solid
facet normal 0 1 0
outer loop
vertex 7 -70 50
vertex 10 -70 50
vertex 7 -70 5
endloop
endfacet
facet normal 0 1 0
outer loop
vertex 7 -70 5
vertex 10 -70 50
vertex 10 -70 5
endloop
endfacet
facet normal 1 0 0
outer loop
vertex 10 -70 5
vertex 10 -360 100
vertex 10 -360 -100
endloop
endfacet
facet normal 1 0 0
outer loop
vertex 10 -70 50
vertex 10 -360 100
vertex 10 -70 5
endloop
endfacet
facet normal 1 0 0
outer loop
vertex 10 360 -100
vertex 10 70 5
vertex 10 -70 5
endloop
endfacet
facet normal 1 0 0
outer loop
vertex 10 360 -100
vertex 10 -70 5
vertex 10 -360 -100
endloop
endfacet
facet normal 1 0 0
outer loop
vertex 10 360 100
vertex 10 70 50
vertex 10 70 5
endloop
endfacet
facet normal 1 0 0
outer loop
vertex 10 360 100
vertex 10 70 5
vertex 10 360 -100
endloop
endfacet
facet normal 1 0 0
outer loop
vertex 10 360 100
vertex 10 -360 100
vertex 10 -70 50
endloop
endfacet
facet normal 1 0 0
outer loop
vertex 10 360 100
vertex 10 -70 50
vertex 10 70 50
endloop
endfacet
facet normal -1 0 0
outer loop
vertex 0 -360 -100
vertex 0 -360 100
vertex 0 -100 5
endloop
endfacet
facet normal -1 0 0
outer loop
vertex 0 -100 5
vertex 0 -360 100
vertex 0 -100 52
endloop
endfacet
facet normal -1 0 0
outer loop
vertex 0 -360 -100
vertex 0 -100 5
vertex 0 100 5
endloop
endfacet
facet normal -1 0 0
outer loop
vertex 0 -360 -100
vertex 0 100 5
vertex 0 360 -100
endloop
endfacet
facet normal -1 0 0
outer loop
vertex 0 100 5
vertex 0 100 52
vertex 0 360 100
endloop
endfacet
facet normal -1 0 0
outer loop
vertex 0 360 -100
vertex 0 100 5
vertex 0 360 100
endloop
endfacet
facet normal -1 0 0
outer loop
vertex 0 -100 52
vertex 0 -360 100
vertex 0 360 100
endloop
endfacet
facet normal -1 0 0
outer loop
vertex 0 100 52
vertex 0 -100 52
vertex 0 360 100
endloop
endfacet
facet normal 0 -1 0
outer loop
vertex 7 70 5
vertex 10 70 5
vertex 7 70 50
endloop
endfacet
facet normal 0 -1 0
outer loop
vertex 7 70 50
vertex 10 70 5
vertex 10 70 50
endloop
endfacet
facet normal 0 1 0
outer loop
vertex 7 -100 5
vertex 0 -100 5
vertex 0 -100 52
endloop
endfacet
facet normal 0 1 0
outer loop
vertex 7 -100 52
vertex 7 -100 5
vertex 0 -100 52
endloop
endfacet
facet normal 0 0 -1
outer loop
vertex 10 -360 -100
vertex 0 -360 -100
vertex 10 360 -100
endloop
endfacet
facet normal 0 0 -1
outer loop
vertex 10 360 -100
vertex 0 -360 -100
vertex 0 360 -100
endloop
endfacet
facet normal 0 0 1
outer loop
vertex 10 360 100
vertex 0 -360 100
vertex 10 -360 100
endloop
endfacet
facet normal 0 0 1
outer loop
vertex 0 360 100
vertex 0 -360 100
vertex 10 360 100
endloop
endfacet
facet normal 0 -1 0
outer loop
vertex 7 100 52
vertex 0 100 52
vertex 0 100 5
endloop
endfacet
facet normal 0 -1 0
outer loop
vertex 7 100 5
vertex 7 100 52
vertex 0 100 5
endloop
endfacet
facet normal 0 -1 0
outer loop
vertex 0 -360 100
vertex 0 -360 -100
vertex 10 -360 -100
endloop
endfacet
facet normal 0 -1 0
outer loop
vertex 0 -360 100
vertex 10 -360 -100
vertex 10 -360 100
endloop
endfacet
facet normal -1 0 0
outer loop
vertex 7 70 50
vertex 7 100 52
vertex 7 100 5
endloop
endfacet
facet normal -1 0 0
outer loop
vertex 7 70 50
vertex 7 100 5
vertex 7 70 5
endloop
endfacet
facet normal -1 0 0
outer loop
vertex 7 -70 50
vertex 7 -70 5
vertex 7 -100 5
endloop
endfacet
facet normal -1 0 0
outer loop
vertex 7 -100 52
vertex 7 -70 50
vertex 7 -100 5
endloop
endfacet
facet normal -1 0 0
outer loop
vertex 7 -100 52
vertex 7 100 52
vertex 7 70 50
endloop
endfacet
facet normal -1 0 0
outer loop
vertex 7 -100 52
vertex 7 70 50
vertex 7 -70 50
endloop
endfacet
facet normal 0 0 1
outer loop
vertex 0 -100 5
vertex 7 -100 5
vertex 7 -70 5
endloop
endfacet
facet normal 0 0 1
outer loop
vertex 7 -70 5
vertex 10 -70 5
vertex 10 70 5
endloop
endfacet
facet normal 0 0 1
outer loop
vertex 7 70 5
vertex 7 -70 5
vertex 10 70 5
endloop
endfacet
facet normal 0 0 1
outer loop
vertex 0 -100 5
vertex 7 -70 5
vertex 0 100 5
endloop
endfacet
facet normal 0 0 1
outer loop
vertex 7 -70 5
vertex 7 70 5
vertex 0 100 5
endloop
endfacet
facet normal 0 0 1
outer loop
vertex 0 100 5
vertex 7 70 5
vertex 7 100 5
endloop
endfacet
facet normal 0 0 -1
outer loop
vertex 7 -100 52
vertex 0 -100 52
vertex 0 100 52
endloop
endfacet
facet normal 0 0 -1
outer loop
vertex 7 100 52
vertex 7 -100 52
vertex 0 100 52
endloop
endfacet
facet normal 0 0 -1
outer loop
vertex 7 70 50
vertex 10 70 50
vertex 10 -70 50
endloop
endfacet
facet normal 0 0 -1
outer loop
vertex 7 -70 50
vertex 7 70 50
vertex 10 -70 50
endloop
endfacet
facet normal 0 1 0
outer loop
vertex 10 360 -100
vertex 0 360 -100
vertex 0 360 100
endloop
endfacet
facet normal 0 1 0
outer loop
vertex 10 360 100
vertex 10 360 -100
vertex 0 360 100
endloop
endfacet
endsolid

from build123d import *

# Parameters (mm, degrees)
F0_W     = 720
F0_H     = 200
F1_DEPTH = 10
F3_DEPTH = 25
F5_DEPTH = 7


with BuildPart() as f1:
    # F0 (on Right) → F1 (new body)
    with BuildSketch(Plane.YZ):
        Rectangle(F0_W, F0_H)
    extrude(amount=F1_DEPTH)

    # F2 (on face) → F3 (cut)
    with BuildSketch(Plane.YZ.offset(10)):
        Polygon((-70, 5), (0, 5), (70, 5), (70, 50), (-70, 50), align=None)
    extrude(amount=-F3_DEPTH, mode=Mode.SUBTRACT)

    # F4 (on face) → F5 (cut)
    with BuildSketch(Plane(origin=(0, 0, 0), x_dir=(0, -1, 0), z_dir=(-1, 0, 0))):
        Polygon((-100, 5), (0, 5), (100, 5), (100, 52), (-100, 52), align=None)
    extrude(amount=-F5_DEPTH, mode=Mode.SUBTRACT)


solid = f1.part
